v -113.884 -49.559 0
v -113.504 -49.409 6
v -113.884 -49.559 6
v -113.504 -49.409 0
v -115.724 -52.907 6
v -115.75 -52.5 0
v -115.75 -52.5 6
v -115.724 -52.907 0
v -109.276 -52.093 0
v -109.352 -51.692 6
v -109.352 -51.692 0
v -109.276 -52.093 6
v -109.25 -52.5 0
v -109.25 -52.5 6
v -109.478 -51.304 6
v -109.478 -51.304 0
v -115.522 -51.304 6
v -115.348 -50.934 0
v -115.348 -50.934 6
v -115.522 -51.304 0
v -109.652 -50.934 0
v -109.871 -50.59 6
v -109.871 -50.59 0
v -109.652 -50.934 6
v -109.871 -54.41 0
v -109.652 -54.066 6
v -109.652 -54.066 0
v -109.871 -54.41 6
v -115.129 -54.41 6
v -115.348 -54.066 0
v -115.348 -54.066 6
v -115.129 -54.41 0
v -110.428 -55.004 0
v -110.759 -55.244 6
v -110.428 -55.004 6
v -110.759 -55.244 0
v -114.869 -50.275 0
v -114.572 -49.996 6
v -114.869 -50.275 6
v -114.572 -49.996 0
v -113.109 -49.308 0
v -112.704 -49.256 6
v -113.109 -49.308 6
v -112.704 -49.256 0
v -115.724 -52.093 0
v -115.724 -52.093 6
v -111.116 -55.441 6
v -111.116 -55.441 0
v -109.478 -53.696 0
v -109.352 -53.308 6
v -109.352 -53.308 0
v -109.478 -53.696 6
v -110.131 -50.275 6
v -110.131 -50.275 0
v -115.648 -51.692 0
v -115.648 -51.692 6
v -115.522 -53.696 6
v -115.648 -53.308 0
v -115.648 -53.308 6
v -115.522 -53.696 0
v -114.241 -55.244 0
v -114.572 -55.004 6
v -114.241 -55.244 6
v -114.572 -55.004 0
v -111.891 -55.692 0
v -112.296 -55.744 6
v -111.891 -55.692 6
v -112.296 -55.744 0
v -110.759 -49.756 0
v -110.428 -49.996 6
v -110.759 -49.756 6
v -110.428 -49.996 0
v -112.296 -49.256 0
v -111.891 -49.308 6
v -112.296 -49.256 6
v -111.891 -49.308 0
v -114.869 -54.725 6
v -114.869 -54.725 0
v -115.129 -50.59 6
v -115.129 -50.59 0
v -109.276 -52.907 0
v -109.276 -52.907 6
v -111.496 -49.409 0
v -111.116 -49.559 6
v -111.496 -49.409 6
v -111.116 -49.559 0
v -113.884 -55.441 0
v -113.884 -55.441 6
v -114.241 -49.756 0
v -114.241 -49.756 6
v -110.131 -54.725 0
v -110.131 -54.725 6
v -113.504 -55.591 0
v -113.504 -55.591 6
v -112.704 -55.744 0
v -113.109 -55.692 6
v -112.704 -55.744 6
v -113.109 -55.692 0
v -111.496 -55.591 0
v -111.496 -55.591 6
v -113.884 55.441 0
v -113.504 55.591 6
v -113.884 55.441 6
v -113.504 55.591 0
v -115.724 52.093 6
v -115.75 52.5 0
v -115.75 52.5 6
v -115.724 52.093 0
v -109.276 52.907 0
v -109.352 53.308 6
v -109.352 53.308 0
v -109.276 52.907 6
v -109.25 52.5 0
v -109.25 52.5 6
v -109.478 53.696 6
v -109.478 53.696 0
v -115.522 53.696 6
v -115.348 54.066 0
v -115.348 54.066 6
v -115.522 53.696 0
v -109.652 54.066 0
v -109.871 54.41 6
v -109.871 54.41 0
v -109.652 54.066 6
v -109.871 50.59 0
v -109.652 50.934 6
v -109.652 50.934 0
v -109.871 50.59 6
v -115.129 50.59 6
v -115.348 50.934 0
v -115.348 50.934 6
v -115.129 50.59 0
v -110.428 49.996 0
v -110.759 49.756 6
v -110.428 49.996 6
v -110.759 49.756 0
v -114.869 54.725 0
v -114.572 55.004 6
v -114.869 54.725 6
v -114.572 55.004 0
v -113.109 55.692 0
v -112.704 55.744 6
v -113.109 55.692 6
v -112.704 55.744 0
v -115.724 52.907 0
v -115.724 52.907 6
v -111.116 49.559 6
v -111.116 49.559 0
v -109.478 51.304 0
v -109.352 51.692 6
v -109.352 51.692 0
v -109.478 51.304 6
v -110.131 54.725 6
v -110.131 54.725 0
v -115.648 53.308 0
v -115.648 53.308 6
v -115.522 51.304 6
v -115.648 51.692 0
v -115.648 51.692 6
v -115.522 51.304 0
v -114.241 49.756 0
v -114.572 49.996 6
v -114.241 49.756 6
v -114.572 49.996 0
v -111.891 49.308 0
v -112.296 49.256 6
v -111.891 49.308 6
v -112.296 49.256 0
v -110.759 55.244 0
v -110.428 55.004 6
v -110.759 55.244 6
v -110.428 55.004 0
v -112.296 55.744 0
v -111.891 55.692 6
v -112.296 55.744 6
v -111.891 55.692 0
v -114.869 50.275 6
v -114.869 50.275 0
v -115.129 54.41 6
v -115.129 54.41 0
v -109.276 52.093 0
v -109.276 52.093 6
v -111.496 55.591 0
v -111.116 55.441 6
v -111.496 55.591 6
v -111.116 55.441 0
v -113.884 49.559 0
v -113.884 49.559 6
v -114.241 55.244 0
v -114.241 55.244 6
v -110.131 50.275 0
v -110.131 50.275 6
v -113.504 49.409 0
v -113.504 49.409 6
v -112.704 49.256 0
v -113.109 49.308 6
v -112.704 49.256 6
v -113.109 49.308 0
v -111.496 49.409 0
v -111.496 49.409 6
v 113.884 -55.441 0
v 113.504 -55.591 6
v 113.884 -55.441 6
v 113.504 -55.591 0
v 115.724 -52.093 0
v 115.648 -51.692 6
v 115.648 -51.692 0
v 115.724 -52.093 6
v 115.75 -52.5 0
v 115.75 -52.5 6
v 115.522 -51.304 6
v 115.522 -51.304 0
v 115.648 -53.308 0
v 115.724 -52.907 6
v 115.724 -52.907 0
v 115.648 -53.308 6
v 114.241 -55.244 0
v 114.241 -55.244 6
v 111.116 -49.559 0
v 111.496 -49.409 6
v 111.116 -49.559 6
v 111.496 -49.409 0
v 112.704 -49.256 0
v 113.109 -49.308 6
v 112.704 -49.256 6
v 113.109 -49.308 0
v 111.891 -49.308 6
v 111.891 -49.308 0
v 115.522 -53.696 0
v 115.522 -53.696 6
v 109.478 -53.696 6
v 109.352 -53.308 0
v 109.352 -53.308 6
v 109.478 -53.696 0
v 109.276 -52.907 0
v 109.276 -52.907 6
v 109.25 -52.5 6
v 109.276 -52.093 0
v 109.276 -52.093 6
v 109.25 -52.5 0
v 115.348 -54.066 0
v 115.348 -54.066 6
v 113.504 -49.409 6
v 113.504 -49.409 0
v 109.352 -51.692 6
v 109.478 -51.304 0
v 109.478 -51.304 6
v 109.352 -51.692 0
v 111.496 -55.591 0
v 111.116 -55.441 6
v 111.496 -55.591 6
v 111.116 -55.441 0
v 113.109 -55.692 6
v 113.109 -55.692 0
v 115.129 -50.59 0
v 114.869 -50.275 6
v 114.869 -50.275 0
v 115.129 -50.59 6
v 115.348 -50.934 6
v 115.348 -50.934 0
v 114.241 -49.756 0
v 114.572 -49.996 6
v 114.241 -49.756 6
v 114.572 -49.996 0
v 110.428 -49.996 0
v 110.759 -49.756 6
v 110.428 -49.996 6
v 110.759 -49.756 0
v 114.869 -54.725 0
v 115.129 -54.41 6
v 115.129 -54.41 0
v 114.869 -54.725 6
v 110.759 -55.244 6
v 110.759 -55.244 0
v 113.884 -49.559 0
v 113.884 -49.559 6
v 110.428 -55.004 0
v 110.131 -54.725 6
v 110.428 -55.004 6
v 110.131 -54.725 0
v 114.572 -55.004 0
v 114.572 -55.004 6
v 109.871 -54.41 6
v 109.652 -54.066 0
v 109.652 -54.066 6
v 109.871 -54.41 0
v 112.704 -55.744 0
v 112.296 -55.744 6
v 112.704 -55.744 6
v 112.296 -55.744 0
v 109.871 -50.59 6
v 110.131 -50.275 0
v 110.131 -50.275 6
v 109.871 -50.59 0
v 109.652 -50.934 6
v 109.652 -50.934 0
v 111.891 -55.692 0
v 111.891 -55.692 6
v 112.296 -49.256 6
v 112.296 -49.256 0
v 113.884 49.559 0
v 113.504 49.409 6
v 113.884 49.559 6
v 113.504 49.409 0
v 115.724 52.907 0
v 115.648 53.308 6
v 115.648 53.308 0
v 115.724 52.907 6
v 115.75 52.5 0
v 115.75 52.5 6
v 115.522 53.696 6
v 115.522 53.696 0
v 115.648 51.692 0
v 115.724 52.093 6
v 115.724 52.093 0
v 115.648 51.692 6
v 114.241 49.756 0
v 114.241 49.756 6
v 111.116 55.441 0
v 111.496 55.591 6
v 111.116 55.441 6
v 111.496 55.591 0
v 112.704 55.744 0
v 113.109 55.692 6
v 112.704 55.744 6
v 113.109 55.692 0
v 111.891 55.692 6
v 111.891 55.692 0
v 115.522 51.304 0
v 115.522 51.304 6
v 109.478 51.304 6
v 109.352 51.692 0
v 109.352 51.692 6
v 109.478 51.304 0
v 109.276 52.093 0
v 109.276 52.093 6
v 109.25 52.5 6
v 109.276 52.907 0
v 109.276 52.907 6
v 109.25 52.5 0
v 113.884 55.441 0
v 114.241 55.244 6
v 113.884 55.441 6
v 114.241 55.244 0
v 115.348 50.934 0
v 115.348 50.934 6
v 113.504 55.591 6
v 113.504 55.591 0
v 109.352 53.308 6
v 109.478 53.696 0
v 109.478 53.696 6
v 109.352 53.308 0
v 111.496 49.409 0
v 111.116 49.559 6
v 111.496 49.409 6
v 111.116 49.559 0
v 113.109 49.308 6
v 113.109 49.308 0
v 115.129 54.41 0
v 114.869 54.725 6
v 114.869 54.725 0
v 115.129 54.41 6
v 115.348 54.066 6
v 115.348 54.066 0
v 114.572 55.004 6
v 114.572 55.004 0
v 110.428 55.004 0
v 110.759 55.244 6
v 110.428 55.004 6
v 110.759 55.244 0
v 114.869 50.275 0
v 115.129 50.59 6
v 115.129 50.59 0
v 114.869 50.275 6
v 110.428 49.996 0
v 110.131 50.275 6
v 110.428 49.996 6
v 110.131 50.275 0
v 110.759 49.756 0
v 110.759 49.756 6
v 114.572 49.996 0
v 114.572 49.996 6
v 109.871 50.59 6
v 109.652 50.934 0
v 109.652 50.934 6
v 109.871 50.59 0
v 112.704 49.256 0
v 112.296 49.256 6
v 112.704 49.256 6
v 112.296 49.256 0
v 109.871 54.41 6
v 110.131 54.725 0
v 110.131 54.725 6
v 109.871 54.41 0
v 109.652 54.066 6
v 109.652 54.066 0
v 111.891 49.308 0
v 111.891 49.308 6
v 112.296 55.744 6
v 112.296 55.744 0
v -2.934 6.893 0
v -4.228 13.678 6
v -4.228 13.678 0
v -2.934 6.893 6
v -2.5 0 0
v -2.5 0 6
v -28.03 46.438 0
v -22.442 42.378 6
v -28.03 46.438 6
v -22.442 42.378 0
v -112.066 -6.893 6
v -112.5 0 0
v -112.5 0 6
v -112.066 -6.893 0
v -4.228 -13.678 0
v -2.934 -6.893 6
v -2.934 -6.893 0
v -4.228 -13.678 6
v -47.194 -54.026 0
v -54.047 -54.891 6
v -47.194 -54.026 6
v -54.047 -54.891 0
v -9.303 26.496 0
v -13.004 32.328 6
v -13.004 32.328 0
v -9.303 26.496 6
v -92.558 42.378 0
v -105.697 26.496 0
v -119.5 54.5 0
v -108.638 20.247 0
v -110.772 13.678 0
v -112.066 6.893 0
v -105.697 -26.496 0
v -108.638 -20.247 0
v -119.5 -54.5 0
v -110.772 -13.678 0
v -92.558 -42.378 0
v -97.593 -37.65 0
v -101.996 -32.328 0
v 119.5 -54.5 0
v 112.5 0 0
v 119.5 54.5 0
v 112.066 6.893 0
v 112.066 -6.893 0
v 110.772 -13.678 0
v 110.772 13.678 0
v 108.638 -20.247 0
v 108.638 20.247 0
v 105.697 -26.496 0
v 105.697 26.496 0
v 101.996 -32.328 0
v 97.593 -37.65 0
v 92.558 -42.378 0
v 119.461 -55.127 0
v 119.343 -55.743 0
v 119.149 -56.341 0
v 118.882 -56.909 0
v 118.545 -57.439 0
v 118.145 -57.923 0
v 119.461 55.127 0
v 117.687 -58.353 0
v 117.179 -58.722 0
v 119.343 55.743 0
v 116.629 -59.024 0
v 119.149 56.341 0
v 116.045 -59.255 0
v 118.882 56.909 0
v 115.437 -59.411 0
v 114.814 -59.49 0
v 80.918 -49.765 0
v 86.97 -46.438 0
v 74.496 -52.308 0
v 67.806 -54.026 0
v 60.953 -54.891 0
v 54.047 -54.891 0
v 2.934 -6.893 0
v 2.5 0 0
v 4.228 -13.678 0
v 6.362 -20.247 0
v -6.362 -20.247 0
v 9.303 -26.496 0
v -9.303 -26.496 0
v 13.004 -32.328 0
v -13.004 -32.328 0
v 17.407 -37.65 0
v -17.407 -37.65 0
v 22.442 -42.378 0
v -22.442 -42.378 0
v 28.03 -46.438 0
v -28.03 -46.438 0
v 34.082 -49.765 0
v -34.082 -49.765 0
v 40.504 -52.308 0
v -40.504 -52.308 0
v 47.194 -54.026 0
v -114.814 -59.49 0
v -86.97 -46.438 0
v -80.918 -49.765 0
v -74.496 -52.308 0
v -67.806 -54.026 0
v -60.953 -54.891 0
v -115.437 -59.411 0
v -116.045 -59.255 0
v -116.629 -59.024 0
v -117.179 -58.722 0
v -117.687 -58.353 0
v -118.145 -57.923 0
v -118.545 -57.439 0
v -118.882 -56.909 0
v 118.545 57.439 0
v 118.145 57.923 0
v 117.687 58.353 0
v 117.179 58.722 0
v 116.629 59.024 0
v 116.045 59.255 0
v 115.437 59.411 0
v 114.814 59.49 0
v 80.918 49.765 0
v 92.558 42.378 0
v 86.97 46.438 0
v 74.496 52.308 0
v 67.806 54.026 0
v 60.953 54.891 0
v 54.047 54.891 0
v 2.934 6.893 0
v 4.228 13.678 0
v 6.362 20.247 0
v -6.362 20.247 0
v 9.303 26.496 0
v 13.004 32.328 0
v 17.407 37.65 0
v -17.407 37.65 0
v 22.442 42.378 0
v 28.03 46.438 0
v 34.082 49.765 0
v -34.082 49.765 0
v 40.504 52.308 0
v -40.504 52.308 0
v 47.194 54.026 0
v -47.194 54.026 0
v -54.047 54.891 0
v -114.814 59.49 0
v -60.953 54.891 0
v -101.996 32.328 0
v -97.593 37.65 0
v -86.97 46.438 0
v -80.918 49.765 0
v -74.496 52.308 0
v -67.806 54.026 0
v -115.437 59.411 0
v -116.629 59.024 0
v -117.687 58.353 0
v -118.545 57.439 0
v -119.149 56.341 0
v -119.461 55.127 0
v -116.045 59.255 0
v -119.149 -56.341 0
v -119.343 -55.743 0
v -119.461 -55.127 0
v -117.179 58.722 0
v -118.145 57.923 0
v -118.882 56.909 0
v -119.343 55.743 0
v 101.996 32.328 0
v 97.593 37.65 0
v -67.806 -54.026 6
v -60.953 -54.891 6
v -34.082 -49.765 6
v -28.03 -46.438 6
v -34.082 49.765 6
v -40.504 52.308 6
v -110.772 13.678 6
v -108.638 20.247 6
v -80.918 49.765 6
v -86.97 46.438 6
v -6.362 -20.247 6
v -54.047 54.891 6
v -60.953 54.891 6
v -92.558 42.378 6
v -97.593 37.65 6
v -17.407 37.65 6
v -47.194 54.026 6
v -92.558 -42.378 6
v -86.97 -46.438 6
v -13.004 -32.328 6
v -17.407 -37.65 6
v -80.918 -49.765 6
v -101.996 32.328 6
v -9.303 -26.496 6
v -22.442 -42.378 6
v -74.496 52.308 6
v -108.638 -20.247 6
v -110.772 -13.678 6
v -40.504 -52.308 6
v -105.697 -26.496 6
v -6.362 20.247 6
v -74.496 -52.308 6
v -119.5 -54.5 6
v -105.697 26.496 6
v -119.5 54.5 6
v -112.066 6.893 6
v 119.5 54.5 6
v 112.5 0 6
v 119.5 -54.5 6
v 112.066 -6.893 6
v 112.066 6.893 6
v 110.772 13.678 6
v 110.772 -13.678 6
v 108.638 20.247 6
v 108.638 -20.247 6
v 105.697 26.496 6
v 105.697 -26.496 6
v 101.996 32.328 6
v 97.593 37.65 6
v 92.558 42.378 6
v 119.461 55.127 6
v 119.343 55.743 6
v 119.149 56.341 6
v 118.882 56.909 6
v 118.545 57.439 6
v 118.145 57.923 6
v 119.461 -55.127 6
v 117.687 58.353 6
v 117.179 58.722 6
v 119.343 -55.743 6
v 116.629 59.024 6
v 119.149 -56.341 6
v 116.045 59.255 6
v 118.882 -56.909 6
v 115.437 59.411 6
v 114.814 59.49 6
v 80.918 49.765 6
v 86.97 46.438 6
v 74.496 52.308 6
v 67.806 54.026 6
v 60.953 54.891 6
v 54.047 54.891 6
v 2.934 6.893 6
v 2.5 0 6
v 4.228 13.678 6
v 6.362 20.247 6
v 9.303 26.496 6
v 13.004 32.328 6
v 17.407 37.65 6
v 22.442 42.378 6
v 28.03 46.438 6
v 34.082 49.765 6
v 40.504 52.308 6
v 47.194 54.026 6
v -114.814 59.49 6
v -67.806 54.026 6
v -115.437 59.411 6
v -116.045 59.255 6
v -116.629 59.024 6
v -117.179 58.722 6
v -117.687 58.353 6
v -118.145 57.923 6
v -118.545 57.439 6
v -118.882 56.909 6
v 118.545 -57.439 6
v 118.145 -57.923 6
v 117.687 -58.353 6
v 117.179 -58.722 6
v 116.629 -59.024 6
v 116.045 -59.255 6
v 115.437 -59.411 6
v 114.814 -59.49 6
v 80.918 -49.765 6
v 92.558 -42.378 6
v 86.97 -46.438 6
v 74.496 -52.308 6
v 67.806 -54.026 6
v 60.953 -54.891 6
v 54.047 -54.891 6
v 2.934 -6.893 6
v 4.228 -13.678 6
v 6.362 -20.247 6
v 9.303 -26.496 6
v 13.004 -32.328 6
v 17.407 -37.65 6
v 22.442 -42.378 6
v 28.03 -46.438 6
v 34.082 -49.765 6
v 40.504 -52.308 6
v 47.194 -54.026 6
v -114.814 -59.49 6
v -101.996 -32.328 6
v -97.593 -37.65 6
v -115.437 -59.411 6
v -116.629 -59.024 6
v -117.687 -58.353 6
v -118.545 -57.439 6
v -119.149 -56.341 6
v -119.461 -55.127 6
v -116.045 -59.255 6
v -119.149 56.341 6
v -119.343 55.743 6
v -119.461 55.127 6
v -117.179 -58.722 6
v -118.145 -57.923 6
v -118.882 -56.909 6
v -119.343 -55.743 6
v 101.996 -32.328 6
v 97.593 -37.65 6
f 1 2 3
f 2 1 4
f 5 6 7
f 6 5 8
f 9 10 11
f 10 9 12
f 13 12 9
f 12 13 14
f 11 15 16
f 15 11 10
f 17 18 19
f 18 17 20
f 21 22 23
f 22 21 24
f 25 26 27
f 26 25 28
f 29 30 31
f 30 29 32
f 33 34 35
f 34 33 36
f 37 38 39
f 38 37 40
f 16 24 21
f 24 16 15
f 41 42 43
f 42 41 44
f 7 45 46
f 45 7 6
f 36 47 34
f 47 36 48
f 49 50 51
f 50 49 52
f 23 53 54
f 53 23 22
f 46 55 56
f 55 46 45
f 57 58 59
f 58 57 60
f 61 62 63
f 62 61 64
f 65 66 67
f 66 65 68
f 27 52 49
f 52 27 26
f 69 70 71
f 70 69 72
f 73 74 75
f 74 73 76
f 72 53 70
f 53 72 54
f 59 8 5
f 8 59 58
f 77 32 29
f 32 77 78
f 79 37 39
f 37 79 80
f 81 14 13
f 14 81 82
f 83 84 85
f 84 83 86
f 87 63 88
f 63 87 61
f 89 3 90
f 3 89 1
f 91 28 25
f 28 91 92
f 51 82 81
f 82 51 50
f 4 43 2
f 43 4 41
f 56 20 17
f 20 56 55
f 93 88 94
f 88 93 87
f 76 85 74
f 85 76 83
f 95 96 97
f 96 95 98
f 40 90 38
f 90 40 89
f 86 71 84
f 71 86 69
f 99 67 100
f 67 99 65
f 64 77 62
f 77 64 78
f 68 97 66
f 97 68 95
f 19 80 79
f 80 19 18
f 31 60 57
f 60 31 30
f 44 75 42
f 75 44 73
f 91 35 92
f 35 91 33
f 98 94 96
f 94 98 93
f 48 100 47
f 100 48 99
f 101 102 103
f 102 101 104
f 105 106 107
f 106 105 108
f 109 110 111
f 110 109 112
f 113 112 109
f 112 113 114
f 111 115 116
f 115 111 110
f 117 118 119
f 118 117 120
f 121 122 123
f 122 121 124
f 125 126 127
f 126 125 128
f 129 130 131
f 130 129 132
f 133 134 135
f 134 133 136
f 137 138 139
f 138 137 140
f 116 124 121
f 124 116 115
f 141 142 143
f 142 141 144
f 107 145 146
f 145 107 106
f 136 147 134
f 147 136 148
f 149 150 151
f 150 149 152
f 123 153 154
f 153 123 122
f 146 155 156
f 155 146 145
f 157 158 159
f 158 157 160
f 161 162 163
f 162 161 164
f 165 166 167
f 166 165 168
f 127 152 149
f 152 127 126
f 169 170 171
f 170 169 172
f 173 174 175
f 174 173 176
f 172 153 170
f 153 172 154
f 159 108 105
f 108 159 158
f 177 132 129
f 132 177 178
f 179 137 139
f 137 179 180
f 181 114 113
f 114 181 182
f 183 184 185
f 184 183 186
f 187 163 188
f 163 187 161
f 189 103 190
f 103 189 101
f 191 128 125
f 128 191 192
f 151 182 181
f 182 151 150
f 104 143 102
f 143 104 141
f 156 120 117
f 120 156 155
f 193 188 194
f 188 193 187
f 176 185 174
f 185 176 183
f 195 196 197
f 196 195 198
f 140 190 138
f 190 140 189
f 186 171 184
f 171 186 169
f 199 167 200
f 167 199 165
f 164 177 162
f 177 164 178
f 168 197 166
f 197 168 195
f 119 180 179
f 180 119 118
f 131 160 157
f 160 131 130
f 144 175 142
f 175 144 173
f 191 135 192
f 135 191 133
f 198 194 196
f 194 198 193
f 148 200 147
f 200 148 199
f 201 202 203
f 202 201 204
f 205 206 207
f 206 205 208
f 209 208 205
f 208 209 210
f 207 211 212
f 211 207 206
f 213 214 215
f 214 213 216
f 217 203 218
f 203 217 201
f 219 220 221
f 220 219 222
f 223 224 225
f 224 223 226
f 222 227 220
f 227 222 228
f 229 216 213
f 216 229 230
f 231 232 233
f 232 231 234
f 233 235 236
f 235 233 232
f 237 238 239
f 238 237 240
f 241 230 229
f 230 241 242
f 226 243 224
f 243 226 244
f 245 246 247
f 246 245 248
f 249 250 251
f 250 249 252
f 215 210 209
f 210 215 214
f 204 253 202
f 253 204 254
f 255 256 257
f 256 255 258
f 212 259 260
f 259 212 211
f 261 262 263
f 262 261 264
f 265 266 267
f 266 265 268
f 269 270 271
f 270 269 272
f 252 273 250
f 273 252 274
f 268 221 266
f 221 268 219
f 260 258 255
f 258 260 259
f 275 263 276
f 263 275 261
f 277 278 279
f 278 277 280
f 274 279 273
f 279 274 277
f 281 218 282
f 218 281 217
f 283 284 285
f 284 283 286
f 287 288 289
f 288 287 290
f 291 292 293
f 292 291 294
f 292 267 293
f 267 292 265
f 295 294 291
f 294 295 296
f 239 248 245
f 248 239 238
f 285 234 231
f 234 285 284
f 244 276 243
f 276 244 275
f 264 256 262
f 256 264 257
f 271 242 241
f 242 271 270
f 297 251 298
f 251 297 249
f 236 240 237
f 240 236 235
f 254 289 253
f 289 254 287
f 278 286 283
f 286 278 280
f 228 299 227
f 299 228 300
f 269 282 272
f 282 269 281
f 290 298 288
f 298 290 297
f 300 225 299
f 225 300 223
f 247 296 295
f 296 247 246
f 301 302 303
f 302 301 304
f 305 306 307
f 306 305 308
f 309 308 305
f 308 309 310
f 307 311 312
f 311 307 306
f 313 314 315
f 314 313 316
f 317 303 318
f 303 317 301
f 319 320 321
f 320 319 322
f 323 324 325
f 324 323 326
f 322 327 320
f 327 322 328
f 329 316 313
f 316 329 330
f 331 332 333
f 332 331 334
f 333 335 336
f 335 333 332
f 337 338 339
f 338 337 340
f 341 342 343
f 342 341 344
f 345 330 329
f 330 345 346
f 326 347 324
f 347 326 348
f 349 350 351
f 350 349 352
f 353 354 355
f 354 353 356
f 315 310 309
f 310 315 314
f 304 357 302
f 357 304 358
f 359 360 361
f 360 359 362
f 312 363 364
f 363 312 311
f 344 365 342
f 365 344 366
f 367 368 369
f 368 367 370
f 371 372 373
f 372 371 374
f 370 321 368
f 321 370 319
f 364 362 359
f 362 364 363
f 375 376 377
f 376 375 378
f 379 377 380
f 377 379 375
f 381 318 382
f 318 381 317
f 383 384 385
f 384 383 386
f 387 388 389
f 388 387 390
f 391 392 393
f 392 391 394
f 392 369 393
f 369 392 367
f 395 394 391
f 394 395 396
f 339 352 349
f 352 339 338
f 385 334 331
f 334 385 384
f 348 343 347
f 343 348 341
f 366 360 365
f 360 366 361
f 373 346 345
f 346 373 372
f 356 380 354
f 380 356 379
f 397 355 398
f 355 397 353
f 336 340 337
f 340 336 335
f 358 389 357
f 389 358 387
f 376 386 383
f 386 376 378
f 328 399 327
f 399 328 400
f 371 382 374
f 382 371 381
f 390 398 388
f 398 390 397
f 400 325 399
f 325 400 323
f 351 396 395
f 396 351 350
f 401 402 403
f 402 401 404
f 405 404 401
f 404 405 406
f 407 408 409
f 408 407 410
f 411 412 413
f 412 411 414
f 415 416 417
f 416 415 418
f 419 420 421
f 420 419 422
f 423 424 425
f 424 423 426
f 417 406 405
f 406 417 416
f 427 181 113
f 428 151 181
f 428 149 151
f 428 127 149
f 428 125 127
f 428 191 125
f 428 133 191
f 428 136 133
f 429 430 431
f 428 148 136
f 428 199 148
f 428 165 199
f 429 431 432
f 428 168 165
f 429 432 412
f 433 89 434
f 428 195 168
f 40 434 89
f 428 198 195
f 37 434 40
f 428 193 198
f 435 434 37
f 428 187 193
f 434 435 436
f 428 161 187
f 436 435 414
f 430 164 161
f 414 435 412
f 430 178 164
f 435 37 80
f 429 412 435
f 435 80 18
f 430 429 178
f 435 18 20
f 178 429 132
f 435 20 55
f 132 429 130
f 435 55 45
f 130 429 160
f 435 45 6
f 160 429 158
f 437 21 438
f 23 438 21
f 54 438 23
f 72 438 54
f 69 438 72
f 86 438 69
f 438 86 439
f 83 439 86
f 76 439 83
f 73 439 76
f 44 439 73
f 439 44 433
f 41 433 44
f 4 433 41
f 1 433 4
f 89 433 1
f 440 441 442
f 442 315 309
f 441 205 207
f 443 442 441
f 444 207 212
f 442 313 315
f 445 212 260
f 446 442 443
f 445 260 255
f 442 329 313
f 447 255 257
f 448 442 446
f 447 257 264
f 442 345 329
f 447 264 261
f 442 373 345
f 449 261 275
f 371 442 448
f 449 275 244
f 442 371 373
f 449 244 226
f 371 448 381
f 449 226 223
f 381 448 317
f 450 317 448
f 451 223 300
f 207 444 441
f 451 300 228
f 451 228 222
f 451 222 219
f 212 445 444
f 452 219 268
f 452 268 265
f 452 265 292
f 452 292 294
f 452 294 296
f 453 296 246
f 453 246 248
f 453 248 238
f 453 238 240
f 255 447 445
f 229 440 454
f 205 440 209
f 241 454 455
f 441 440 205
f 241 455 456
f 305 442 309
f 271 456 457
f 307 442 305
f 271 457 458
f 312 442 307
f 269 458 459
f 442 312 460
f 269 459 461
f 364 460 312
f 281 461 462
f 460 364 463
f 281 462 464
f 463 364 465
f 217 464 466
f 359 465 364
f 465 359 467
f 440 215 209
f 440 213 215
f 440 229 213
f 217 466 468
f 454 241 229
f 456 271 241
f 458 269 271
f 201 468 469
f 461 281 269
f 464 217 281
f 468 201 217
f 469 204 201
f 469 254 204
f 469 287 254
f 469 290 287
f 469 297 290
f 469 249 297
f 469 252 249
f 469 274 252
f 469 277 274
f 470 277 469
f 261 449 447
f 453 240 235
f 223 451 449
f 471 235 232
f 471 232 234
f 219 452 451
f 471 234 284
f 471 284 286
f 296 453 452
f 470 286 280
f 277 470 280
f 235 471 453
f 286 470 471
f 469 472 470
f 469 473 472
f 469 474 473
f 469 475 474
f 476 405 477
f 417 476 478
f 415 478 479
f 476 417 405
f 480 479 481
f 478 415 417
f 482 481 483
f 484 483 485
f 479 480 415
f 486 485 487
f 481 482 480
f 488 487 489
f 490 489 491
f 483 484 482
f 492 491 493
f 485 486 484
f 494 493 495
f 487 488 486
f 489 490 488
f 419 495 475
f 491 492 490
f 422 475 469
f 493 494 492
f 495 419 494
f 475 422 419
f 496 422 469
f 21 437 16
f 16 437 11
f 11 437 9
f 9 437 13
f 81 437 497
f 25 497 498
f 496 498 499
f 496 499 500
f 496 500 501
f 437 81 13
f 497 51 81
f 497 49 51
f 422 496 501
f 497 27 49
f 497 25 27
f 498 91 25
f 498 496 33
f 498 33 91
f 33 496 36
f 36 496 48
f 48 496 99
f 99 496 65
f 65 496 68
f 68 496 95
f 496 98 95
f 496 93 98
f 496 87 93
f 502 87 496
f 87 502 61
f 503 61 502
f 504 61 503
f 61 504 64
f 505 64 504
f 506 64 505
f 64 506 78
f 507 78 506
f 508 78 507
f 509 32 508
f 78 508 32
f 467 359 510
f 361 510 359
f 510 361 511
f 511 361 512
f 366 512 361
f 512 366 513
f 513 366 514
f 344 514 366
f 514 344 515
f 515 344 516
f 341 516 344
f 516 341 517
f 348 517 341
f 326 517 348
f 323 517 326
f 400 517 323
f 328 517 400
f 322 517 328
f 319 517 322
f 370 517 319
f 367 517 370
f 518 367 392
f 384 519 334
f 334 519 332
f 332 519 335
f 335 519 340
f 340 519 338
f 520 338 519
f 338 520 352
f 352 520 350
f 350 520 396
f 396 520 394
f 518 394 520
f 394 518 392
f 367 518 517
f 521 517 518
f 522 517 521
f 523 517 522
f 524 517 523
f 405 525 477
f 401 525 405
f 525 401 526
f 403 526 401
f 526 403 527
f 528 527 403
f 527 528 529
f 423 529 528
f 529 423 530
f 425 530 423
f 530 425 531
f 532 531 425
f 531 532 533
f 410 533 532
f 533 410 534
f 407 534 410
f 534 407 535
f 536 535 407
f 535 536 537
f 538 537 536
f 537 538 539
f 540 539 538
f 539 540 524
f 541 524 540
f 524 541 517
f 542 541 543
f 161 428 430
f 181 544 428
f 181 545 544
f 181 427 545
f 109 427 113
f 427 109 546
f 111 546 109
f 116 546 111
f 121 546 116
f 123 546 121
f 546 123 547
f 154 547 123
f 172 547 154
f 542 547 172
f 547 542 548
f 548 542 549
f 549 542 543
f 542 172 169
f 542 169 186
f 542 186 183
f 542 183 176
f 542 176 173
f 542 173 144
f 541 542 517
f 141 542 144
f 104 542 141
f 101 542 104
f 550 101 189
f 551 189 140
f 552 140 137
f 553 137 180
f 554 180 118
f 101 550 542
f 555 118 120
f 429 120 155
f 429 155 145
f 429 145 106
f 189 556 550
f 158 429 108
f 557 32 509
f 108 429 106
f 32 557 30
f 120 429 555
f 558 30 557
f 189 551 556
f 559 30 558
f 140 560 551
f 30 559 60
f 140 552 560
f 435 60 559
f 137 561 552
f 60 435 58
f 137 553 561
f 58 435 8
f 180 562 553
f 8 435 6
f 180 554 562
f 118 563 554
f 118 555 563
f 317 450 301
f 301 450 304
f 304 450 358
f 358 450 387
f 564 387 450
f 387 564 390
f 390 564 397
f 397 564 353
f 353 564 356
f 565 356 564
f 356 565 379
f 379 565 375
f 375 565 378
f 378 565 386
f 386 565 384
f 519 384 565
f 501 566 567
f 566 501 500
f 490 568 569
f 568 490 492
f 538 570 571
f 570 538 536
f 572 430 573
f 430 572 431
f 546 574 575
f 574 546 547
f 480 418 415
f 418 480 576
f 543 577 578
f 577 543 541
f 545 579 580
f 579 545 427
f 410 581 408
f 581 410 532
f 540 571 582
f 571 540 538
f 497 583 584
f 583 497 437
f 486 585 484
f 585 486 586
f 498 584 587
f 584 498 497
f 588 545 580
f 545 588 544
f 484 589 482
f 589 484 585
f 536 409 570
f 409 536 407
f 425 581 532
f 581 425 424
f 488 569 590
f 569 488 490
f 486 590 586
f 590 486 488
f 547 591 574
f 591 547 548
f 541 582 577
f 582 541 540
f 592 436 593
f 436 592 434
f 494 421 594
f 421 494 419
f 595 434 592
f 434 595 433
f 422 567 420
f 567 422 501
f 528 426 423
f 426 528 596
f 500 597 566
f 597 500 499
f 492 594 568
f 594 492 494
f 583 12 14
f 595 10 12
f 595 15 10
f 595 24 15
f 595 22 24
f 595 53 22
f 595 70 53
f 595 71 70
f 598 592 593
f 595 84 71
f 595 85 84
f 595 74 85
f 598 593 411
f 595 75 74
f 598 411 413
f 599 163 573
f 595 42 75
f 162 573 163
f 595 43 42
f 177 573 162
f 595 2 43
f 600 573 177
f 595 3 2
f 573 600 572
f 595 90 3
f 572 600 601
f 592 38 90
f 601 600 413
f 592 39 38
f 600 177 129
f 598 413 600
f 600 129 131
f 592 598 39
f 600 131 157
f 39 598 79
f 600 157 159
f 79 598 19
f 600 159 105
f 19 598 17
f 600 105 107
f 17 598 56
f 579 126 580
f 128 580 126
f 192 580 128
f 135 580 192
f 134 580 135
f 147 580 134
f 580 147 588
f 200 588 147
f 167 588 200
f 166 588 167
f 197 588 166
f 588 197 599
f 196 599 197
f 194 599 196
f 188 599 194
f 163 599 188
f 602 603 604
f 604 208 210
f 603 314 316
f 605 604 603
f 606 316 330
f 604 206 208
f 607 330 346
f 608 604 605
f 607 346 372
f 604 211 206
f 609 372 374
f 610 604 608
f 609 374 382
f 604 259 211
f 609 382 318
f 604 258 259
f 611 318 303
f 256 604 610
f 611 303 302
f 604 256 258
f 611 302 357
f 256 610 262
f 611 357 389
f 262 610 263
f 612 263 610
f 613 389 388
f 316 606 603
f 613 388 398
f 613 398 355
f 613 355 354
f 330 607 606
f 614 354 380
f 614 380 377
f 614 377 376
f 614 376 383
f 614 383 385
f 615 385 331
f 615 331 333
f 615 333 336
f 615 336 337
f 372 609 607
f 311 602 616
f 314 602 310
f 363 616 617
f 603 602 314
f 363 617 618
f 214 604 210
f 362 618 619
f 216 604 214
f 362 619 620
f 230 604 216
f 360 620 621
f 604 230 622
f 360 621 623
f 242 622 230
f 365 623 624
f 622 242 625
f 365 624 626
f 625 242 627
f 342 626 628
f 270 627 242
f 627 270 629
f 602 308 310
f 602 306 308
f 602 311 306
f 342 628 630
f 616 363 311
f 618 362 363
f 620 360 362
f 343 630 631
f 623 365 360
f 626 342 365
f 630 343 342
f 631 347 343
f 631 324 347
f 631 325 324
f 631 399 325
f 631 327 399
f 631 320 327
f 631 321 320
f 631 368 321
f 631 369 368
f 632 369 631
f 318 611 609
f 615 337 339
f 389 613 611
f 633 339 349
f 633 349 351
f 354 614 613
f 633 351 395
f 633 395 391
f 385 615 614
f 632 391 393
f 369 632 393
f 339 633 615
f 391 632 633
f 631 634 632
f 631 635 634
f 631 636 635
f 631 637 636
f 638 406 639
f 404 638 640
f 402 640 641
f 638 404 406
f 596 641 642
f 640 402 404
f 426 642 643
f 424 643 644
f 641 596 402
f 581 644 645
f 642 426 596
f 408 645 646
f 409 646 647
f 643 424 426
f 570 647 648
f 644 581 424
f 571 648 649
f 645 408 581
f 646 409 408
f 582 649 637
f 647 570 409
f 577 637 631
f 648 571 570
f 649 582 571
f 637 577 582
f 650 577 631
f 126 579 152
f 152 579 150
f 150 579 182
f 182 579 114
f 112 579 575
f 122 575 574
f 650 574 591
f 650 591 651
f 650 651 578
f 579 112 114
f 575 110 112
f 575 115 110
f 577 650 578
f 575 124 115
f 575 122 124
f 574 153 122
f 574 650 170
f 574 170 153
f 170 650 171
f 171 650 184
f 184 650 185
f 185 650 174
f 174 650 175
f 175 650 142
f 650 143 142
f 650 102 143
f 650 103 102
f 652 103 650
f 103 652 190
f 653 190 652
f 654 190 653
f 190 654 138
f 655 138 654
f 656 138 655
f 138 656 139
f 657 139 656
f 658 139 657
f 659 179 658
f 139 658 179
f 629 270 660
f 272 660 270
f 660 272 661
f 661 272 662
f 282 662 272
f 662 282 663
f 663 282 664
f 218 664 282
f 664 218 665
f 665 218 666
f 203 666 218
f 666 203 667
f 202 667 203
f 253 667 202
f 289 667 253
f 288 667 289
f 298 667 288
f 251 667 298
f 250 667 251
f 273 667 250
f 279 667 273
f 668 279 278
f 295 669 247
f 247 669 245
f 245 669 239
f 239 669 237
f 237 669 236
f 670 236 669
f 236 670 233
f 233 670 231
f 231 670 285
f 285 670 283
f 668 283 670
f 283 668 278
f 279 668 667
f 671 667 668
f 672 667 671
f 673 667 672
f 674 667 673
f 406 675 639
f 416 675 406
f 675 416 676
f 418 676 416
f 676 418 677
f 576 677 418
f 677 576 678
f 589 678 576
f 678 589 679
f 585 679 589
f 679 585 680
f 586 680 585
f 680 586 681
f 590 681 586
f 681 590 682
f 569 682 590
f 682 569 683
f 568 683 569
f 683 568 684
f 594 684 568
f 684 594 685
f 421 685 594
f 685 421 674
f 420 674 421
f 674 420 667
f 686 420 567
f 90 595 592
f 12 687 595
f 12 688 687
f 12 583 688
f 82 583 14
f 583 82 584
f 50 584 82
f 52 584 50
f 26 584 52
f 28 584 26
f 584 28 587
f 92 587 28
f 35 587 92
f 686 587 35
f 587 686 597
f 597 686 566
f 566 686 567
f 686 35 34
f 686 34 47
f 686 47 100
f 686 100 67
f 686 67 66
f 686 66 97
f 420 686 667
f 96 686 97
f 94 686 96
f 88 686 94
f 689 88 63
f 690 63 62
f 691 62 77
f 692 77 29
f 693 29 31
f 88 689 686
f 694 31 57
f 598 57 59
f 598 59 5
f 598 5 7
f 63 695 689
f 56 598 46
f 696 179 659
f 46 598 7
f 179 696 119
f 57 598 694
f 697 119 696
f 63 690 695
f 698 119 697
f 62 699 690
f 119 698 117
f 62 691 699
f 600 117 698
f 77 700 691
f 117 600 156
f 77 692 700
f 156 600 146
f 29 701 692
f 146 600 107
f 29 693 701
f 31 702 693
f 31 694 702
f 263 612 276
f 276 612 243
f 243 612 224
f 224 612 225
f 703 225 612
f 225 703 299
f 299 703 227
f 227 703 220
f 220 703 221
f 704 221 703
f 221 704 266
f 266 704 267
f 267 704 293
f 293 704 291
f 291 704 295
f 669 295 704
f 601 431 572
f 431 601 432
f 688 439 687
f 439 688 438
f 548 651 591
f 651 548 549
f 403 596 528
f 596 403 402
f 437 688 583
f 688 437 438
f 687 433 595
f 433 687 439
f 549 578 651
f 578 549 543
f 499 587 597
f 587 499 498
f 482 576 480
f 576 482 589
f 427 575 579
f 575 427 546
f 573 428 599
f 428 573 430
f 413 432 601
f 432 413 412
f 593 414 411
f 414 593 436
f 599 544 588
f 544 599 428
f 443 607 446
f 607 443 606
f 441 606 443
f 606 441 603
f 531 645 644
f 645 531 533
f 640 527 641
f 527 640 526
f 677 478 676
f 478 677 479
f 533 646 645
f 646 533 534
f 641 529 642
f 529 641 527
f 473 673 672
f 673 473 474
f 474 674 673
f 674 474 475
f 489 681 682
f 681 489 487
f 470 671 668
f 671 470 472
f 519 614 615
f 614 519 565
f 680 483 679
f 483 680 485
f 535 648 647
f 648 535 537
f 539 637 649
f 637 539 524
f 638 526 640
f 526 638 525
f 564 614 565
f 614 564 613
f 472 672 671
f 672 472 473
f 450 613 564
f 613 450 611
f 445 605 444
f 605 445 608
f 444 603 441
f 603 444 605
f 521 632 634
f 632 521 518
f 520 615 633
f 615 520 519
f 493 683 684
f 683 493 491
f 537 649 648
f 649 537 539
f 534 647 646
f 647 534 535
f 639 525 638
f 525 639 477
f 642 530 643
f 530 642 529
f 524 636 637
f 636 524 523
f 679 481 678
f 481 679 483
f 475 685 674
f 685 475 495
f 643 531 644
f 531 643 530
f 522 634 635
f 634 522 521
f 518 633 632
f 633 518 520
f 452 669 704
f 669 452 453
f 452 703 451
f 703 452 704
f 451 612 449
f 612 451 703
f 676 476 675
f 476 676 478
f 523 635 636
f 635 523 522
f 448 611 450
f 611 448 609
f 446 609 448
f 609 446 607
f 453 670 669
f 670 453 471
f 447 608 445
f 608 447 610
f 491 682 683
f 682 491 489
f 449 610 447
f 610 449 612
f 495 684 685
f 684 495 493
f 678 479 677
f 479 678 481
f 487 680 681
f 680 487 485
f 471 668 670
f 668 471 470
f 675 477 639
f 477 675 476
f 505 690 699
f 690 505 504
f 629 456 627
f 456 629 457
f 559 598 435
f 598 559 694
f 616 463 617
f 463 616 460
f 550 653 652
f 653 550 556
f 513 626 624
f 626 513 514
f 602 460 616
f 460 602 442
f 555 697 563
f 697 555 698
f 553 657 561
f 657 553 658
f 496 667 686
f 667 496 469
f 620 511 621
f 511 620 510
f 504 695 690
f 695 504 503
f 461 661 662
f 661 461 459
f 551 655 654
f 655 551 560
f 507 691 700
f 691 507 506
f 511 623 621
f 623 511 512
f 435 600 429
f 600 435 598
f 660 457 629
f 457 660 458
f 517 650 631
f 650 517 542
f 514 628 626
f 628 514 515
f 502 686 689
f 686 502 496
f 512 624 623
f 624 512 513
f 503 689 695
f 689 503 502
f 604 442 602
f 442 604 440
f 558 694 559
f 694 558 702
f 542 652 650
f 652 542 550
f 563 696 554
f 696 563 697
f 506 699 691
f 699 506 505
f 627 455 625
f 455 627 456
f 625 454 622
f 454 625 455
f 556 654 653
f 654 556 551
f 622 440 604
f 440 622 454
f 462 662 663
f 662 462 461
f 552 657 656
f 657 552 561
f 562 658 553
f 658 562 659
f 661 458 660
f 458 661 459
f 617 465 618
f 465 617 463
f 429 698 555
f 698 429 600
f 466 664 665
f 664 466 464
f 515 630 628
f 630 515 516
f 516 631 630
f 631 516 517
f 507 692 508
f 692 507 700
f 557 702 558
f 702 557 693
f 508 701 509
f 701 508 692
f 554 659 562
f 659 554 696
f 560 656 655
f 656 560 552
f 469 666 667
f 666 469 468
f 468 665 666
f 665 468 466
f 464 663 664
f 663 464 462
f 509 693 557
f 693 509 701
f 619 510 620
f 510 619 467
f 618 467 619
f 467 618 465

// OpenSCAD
$fn = 50;


difference() {
	union() {
		hull() {
			translate(v = [-114.5000000000, 54.5000000000, 0]) {
				cylinder(h = 6, r = 5);
			}
			translate(v = [114.5000000000, 54.5000000000, 0]) {
				cylinder(h = 6, r = 5);
			}
			translate(v = [-114.5000000000, -54.5000000000, 0]) {
				cylinder(h = 6, r = 5);
			}
			translate(v = [114.5000000000, -54.5000000000, 0]) {
				cylinder(h = 6, r = 5);
			}
		}
	}
	union() {
		#translate(v = [-112.5000000000, -52.5000000000, -100.0000000000]) {
			cylinder(h = 200, r = 3.2500000000);
		}
		#translate(v = [-112.5000000000, 52.5000000000, -100.0000000000]) {
			cylinder(h = 200, r = 3.2500000000);
		}
		#translate(v = [112.5000000000, -52.5000000000, -100.0000000000]) {
			cylinder(h = 200, r = 3.2500000000);
		}
		#translate(v = [112.5000000000, 52.5000000000, -100.0000000000]) {
			cylinder(h = 200, r = 3.2500000000);
		}
		#translate(v = [-57.5000000000, 0, 0]) {
			cylinder(h = 6, r = 55.0000000000);
		}
		#translate(v = [57.5000000000, 0, 0]) {
			cylinder(h = 6, r = 55.0000000000);
		}
	}
}
